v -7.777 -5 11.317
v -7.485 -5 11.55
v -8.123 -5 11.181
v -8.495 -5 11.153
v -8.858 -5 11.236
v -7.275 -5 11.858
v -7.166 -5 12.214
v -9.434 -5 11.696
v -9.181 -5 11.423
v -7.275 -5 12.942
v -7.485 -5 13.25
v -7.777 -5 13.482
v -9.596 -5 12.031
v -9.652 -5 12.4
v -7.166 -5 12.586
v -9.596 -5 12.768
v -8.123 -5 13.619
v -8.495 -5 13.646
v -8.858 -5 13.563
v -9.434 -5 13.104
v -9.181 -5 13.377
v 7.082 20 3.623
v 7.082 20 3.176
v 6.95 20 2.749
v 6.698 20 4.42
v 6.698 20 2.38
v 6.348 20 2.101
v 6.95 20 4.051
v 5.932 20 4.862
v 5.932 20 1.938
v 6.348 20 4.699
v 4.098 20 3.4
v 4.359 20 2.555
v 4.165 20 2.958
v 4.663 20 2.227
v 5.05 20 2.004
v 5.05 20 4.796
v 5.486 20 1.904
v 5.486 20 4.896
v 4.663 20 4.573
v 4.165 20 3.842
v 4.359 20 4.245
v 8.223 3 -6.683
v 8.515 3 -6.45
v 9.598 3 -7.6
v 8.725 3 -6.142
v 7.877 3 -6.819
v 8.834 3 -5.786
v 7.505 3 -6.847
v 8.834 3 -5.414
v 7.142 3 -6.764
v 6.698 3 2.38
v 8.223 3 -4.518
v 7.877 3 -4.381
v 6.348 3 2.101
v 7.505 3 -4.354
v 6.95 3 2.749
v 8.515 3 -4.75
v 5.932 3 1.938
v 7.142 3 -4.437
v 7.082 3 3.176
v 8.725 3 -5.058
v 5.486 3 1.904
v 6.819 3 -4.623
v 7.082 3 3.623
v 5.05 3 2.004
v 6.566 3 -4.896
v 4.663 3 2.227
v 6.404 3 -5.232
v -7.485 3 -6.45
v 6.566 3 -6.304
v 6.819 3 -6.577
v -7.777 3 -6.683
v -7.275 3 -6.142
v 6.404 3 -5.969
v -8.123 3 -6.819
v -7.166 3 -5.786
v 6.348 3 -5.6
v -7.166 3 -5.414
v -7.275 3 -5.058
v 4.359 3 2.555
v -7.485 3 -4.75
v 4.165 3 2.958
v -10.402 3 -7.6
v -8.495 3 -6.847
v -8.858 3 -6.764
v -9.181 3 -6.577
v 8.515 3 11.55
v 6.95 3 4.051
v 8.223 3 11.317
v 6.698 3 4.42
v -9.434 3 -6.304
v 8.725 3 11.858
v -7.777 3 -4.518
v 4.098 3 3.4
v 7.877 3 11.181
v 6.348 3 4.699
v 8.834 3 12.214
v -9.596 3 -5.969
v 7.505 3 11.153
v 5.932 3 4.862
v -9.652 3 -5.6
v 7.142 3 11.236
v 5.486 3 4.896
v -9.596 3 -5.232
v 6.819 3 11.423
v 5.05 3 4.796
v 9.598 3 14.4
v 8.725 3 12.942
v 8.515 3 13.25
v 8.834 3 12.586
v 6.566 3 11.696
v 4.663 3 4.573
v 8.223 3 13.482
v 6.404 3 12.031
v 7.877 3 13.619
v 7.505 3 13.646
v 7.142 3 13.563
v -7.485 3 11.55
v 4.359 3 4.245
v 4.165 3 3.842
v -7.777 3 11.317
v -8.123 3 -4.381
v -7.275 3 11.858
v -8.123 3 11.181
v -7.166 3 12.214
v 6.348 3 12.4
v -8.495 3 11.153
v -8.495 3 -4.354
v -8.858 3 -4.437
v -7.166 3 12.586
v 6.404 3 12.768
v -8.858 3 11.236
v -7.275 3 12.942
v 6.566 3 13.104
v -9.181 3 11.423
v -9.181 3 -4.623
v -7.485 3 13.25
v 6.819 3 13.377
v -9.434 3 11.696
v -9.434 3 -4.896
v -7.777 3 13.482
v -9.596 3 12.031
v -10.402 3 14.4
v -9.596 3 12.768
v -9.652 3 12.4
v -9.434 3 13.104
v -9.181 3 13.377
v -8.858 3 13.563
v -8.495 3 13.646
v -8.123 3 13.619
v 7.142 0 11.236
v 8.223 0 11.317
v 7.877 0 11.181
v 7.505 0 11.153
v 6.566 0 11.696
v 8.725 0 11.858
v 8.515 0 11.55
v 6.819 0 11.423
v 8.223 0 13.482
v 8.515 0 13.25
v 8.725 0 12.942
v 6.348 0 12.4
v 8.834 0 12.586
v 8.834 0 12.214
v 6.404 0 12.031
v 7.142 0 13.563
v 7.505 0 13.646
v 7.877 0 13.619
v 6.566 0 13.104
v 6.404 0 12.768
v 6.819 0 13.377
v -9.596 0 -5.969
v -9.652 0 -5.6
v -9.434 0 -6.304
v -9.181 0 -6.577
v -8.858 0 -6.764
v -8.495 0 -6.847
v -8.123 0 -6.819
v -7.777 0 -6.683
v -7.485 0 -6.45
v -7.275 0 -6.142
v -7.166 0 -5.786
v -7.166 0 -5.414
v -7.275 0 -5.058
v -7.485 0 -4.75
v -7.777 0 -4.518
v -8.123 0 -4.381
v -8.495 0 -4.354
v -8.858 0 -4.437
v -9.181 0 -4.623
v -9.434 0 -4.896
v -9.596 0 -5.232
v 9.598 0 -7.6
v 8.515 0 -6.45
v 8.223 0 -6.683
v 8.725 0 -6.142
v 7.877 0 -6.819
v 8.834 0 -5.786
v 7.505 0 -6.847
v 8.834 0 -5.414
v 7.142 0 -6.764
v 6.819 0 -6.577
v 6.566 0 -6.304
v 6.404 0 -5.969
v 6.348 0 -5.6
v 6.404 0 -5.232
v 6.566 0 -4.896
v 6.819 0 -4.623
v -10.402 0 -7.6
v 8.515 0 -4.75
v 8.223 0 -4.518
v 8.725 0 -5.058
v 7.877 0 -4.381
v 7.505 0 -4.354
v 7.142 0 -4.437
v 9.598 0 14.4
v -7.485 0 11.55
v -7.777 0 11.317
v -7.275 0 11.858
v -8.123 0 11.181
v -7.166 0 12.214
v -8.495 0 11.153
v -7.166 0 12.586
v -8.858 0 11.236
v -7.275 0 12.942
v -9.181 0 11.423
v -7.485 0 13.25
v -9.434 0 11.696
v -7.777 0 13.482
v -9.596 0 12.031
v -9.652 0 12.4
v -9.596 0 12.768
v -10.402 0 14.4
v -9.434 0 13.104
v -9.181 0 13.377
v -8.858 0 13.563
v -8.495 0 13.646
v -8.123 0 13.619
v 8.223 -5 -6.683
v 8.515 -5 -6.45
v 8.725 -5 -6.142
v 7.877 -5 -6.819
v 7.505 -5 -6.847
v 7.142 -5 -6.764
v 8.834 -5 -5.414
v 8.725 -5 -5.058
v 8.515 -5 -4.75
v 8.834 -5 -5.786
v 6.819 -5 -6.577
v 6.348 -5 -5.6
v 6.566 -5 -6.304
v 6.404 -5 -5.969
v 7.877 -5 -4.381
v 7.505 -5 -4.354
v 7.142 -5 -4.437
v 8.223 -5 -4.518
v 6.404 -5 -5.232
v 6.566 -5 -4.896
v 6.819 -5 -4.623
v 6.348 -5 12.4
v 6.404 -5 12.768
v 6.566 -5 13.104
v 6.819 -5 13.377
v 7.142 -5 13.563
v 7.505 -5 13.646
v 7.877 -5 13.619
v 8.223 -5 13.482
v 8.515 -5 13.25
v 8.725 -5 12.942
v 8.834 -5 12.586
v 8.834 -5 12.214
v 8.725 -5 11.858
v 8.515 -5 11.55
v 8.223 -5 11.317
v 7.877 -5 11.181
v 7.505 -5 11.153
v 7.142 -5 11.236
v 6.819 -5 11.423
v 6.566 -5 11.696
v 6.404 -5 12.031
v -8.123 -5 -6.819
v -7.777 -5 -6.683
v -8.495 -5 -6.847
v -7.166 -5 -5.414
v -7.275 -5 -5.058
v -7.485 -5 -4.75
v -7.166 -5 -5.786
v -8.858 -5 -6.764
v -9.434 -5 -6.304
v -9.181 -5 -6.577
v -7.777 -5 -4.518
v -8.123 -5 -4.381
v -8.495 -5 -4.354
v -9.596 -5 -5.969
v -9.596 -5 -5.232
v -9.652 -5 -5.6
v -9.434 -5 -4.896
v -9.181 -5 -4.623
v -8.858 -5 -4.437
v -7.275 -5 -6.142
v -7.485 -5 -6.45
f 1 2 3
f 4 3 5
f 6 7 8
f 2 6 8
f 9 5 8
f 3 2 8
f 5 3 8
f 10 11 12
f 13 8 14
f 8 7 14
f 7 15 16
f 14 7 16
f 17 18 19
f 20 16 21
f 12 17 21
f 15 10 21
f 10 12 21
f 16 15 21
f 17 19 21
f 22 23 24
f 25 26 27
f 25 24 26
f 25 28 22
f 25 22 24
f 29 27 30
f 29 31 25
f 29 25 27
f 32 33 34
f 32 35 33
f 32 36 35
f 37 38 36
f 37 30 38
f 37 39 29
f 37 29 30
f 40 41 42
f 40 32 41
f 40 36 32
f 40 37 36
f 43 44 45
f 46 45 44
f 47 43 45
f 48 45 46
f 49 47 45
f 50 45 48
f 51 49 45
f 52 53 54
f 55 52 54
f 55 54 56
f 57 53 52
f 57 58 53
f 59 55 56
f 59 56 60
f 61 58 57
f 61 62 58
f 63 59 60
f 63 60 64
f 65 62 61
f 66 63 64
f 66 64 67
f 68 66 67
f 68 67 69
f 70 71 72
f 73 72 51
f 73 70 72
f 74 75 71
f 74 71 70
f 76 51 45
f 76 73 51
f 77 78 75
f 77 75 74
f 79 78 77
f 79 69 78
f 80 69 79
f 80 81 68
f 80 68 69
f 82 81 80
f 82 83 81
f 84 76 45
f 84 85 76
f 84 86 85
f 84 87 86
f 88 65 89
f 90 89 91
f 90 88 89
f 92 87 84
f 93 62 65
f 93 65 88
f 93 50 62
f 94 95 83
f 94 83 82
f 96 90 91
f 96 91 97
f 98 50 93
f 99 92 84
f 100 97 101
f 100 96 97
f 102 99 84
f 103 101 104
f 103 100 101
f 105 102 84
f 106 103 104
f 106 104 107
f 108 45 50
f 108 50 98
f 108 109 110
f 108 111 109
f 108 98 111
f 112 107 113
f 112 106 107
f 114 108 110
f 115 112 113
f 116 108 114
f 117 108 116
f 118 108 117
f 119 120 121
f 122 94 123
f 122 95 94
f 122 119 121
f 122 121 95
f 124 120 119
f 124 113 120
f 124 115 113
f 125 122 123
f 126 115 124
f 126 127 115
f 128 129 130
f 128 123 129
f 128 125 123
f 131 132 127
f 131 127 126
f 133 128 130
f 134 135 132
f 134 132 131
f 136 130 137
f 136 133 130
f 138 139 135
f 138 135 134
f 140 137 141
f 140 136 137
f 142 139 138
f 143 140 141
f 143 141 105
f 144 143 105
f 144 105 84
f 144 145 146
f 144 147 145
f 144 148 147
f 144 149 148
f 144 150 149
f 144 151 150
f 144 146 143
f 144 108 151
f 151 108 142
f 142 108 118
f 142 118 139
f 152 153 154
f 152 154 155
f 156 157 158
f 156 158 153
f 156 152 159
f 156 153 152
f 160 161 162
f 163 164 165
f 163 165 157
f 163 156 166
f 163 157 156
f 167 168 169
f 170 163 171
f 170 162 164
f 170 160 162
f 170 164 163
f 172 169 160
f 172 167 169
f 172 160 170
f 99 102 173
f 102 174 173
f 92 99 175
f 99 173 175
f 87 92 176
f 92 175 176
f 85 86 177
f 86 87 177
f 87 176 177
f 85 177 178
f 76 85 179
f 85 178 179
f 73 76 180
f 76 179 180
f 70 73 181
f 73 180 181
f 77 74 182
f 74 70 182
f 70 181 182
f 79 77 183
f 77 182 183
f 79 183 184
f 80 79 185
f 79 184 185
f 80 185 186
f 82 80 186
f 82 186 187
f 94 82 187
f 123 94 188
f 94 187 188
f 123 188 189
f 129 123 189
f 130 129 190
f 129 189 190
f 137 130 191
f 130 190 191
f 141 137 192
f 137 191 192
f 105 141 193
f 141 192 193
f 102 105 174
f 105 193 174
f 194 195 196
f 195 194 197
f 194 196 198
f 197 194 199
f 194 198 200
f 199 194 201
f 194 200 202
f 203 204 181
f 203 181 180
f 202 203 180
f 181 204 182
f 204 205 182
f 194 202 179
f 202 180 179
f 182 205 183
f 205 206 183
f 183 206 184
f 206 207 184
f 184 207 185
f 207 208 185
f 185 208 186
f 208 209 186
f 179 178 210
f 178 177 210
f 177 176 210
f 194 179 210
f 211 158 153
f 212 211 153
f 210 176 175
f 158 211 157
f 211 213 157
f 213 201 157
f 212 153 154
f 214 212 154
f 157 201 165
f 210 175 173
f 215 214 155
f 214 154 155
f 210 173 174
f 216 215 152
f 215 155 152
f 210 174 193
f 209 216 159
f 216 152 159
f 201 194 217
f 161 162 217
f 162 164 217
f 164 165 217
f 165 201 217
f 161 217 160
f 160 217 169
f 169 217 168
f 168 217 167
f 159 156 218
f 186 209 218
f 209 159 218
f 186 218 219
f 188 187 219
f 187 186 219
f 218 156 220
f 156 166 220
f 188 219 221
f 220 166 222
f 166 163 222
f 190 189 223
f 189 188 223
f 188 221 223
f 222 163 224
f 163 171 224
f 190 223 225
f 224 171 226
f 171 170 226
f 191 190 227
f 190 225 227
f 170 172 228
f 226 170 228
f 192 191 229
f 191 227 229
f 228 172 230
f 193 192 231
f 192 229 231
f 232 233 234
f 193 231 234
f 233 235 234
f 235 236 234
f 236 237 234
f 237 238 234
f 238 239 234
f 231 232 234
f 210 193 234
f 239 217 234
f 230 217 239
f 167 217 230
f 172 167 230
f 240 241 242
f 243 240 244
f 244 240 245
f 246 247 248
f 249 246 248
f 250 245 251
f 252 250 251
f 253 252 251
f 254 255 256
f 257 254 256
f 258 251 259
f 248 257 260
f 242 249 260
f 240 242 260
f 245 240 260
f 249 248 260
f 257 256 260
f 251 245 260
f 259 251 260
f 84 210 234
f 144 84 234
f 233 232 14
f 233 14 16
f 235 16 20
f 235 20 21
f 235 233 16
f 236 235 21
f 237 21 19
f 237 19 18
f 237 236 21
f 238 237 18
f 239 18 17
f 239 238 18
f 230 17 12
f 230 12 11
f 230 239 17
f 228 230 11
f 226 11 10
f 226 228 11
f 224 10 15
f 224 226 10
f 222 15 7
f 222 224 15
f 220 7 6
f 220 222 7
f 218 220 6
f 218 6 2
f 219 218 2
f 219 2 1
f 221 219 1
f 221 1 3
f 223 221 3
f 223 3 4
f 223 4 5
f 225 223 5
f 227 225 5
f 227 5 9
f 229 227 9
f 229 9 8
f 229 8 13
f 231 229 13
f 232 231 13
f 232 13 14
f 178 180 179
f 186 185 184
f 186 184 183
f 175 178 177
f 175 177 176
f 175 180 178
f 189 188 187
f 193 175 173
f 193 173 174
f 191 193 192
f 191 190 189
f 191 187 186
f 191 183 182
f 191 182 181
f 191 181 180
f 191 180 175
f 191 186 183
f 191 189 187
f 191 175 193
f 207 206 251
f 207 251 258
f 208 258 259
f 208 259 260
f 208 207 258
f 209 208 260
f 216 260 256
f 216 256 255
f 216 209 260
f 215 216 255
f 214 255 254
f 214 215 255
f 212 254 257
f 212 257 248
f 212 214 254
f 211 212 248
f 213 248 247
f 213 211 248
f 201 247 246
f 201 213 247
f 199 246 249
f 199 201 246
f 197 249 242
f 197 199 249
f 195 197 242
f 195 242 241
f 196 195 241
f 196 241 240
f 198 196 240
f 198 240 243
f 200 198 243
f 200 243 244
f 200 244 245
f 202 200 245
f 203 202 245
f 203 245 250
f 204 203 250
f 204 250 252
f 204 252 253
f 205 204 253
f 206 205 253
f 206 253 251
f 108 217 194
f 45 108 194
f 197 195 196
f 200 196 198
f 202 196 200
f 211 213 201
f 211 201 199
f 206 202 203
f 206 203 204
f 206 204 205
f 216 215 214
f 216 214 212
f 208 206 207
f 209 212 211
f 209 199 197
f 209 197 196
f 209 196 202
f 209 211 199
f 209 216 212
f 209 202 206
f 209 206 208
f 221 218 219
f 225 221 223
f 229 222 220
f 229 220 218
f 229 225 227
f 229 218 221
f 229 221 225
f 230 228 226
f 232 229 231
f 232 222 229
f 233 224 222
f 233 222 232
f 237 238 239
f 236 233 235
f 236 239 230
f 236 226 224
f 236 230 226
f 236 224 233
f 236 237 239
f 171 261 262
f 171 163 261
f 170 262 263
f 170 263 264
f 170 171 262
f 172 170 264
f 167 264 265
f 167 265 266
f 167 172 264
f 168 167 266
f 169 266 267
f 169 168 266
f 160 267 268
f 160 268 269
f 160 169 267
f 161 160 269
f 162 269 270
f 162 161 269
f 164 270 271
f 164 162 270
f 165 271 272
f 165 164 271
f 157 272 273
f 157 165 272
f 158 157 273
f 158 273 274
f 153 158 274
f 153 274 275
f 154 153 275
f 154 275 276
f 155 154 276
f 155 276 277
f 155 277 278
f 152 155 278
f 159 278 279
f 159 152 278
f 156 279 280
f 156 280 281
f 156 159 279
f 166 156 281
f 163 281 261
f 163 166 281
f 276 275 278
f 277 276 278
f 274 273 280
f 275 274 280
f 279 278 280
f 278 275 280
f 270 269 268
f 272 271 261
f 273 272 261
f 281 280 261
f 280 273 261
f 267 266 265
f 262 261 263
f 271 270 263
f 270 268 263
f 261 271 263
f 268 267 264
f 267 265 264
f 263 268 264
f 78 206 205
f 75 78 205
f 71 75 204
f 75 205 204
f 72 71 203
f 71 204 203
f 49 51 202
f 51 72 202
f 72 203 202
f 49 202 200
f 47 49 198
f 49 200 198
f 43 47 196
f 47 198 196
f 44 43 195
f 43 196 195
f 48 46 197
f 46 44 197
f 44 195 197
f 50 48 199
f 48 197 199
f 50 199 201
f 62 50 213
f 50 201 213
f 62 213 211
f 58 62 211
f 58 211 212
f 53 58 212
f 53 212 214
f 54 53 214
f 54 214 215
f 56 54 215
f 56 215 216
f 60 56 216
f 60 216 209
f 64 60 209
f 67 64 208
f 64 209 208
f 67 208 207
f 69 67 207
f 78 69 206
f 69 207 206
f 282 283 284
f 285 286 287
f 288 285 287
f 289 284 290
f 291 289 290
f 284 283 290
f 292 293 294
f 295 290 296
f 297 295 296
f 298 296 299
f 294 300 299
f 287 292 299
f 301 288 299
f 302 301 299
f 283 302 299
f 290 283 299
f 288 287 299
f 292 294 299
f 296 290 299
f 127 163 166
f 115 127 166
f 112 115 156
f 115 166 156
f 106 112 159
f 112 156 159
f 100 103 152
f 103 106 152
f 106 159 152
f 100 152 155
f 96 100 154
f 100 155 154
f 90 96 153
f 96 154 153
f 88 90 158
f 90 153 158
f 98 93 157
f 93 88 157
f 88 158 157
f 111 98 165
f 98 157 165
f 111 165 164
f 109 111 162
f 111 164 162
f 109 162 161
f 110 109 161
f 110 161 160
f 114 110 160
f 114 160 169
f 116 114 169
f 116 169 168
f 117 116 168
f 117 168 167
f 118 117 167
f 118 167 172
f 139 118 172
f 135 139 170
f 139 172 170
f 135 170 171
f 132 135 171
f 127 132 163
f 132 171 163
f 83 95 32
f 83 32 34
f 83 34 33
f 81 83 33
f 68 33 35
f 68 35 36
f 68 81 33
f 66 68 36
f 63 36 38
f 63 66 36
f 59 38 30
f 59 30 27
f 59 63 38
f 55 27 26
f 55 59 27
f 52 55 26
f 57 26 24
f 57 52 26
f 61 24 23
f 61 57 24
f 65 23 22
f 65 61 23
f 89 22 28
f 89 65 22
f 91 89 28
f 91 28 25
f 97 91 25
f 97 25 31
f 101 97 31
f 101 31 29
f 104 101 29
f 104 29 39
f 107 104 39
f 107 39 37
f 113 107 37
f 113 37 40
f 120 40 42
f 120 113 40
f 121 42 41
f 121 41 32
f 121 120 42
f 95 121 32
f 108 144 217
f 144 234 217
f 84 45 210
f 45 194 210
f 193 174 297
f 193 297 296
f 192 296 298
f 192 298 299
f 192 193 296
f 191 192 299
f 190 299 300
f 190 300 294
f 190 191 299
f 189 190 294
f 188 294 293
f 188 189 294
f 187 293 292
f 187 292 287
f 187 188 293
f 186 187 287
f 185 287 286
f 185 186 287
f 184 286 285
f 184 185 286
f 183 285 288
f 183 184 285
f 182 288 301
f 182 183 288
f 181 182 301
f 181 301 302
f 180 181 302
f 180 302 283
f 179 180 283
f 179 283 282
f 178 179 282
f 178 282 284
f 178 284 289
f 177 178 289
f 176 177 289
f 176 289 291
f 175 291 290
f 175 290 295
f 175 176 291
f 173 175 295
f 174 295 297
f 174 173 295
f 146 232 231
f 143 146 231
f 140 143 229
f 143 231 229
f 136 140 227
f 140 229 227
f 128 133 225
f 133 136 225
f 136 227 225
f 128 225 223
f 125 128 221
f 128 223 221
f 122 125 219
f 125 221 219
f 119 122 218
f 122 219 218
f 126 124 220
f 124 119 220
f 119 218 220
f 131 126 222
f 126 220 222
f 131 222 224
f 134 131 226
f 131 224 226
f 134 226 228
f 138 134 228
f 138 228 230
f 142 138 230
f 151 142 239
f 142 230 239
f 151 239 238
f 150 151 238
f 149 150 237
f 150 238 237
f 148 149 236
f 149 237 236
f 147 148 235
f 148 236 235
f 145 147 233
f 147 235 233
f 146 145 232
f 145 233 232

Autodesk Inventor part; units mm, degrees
ref_plane "YZ Plane" through (0, 0, 0) normal (1, 0, 0) x (0, 1, 0)
ref_plane "XZ Plane" through (0, 0, 0) normal (0, 1, 0) x (-1, 0, 0)
ref_plane "XY Plane" through (0, 0, 0) normal (0, 0, 1) x (1, 0, 0)
sketch "Sketch1" plane through (0, 0, 0) normal (0, 1, 0) x (-1, 0, 0)
  line L0 (15.7413, 3.3999) -> (-17.2771, 3.3999)
  line L1 (0.4016, 18.4289) -> (0.4016, -19.5807)
  line L2 (10.4016, 14.3999) -> (-9.5984, 14.3999)
  line L3 (-9.5984, 14.3999) -> (-9.5984, -7.6001)
  line L4 (-9.5984, -7.6001) -> (10.4016, -7.6001)
  line L5 (10.4016, -7.6001) -> (10.4016, 14.3999)
  circle A0 centre (8.4016, 12.3999) radius 1.25
  circle A1 centre (8.4016, -5.6001) radius 1.25
  circle A2 centre (-7.5984, 12.3999) radius 1.25
  circle A3 centre (-7.5984, -5.6001) radius 1.25
  circle A4 centre (-5.5984, 3.3999) radius 1.5
  point P0 (0, 0)
  dimension "d0" = 2.5
  dimension "d1" = 18
  dimension "d2" = 22
  dimension "d3" = 20
  dimension "d4" = 16
  dimension "d5" = 3
  dimension "d6" = 16
extrude "Extrusion1" add sketch "Sketch1" along normal blind 3 contours L5 L4 L1 L0 | L0 L1 L2 L5 | L1 L4 L3 L0 A4 | L0 A4 L3 L2 L1
extrude "Extrusion2" add sketch "Sketch1" along normal blind 20 contours A4 L0 | L0 A4
extrude "Extrusion3" add sketch "Sketch1" against normal blind 5 contours A0 | A1 | A2 | A3
properties part number "slider" material "Gold"
